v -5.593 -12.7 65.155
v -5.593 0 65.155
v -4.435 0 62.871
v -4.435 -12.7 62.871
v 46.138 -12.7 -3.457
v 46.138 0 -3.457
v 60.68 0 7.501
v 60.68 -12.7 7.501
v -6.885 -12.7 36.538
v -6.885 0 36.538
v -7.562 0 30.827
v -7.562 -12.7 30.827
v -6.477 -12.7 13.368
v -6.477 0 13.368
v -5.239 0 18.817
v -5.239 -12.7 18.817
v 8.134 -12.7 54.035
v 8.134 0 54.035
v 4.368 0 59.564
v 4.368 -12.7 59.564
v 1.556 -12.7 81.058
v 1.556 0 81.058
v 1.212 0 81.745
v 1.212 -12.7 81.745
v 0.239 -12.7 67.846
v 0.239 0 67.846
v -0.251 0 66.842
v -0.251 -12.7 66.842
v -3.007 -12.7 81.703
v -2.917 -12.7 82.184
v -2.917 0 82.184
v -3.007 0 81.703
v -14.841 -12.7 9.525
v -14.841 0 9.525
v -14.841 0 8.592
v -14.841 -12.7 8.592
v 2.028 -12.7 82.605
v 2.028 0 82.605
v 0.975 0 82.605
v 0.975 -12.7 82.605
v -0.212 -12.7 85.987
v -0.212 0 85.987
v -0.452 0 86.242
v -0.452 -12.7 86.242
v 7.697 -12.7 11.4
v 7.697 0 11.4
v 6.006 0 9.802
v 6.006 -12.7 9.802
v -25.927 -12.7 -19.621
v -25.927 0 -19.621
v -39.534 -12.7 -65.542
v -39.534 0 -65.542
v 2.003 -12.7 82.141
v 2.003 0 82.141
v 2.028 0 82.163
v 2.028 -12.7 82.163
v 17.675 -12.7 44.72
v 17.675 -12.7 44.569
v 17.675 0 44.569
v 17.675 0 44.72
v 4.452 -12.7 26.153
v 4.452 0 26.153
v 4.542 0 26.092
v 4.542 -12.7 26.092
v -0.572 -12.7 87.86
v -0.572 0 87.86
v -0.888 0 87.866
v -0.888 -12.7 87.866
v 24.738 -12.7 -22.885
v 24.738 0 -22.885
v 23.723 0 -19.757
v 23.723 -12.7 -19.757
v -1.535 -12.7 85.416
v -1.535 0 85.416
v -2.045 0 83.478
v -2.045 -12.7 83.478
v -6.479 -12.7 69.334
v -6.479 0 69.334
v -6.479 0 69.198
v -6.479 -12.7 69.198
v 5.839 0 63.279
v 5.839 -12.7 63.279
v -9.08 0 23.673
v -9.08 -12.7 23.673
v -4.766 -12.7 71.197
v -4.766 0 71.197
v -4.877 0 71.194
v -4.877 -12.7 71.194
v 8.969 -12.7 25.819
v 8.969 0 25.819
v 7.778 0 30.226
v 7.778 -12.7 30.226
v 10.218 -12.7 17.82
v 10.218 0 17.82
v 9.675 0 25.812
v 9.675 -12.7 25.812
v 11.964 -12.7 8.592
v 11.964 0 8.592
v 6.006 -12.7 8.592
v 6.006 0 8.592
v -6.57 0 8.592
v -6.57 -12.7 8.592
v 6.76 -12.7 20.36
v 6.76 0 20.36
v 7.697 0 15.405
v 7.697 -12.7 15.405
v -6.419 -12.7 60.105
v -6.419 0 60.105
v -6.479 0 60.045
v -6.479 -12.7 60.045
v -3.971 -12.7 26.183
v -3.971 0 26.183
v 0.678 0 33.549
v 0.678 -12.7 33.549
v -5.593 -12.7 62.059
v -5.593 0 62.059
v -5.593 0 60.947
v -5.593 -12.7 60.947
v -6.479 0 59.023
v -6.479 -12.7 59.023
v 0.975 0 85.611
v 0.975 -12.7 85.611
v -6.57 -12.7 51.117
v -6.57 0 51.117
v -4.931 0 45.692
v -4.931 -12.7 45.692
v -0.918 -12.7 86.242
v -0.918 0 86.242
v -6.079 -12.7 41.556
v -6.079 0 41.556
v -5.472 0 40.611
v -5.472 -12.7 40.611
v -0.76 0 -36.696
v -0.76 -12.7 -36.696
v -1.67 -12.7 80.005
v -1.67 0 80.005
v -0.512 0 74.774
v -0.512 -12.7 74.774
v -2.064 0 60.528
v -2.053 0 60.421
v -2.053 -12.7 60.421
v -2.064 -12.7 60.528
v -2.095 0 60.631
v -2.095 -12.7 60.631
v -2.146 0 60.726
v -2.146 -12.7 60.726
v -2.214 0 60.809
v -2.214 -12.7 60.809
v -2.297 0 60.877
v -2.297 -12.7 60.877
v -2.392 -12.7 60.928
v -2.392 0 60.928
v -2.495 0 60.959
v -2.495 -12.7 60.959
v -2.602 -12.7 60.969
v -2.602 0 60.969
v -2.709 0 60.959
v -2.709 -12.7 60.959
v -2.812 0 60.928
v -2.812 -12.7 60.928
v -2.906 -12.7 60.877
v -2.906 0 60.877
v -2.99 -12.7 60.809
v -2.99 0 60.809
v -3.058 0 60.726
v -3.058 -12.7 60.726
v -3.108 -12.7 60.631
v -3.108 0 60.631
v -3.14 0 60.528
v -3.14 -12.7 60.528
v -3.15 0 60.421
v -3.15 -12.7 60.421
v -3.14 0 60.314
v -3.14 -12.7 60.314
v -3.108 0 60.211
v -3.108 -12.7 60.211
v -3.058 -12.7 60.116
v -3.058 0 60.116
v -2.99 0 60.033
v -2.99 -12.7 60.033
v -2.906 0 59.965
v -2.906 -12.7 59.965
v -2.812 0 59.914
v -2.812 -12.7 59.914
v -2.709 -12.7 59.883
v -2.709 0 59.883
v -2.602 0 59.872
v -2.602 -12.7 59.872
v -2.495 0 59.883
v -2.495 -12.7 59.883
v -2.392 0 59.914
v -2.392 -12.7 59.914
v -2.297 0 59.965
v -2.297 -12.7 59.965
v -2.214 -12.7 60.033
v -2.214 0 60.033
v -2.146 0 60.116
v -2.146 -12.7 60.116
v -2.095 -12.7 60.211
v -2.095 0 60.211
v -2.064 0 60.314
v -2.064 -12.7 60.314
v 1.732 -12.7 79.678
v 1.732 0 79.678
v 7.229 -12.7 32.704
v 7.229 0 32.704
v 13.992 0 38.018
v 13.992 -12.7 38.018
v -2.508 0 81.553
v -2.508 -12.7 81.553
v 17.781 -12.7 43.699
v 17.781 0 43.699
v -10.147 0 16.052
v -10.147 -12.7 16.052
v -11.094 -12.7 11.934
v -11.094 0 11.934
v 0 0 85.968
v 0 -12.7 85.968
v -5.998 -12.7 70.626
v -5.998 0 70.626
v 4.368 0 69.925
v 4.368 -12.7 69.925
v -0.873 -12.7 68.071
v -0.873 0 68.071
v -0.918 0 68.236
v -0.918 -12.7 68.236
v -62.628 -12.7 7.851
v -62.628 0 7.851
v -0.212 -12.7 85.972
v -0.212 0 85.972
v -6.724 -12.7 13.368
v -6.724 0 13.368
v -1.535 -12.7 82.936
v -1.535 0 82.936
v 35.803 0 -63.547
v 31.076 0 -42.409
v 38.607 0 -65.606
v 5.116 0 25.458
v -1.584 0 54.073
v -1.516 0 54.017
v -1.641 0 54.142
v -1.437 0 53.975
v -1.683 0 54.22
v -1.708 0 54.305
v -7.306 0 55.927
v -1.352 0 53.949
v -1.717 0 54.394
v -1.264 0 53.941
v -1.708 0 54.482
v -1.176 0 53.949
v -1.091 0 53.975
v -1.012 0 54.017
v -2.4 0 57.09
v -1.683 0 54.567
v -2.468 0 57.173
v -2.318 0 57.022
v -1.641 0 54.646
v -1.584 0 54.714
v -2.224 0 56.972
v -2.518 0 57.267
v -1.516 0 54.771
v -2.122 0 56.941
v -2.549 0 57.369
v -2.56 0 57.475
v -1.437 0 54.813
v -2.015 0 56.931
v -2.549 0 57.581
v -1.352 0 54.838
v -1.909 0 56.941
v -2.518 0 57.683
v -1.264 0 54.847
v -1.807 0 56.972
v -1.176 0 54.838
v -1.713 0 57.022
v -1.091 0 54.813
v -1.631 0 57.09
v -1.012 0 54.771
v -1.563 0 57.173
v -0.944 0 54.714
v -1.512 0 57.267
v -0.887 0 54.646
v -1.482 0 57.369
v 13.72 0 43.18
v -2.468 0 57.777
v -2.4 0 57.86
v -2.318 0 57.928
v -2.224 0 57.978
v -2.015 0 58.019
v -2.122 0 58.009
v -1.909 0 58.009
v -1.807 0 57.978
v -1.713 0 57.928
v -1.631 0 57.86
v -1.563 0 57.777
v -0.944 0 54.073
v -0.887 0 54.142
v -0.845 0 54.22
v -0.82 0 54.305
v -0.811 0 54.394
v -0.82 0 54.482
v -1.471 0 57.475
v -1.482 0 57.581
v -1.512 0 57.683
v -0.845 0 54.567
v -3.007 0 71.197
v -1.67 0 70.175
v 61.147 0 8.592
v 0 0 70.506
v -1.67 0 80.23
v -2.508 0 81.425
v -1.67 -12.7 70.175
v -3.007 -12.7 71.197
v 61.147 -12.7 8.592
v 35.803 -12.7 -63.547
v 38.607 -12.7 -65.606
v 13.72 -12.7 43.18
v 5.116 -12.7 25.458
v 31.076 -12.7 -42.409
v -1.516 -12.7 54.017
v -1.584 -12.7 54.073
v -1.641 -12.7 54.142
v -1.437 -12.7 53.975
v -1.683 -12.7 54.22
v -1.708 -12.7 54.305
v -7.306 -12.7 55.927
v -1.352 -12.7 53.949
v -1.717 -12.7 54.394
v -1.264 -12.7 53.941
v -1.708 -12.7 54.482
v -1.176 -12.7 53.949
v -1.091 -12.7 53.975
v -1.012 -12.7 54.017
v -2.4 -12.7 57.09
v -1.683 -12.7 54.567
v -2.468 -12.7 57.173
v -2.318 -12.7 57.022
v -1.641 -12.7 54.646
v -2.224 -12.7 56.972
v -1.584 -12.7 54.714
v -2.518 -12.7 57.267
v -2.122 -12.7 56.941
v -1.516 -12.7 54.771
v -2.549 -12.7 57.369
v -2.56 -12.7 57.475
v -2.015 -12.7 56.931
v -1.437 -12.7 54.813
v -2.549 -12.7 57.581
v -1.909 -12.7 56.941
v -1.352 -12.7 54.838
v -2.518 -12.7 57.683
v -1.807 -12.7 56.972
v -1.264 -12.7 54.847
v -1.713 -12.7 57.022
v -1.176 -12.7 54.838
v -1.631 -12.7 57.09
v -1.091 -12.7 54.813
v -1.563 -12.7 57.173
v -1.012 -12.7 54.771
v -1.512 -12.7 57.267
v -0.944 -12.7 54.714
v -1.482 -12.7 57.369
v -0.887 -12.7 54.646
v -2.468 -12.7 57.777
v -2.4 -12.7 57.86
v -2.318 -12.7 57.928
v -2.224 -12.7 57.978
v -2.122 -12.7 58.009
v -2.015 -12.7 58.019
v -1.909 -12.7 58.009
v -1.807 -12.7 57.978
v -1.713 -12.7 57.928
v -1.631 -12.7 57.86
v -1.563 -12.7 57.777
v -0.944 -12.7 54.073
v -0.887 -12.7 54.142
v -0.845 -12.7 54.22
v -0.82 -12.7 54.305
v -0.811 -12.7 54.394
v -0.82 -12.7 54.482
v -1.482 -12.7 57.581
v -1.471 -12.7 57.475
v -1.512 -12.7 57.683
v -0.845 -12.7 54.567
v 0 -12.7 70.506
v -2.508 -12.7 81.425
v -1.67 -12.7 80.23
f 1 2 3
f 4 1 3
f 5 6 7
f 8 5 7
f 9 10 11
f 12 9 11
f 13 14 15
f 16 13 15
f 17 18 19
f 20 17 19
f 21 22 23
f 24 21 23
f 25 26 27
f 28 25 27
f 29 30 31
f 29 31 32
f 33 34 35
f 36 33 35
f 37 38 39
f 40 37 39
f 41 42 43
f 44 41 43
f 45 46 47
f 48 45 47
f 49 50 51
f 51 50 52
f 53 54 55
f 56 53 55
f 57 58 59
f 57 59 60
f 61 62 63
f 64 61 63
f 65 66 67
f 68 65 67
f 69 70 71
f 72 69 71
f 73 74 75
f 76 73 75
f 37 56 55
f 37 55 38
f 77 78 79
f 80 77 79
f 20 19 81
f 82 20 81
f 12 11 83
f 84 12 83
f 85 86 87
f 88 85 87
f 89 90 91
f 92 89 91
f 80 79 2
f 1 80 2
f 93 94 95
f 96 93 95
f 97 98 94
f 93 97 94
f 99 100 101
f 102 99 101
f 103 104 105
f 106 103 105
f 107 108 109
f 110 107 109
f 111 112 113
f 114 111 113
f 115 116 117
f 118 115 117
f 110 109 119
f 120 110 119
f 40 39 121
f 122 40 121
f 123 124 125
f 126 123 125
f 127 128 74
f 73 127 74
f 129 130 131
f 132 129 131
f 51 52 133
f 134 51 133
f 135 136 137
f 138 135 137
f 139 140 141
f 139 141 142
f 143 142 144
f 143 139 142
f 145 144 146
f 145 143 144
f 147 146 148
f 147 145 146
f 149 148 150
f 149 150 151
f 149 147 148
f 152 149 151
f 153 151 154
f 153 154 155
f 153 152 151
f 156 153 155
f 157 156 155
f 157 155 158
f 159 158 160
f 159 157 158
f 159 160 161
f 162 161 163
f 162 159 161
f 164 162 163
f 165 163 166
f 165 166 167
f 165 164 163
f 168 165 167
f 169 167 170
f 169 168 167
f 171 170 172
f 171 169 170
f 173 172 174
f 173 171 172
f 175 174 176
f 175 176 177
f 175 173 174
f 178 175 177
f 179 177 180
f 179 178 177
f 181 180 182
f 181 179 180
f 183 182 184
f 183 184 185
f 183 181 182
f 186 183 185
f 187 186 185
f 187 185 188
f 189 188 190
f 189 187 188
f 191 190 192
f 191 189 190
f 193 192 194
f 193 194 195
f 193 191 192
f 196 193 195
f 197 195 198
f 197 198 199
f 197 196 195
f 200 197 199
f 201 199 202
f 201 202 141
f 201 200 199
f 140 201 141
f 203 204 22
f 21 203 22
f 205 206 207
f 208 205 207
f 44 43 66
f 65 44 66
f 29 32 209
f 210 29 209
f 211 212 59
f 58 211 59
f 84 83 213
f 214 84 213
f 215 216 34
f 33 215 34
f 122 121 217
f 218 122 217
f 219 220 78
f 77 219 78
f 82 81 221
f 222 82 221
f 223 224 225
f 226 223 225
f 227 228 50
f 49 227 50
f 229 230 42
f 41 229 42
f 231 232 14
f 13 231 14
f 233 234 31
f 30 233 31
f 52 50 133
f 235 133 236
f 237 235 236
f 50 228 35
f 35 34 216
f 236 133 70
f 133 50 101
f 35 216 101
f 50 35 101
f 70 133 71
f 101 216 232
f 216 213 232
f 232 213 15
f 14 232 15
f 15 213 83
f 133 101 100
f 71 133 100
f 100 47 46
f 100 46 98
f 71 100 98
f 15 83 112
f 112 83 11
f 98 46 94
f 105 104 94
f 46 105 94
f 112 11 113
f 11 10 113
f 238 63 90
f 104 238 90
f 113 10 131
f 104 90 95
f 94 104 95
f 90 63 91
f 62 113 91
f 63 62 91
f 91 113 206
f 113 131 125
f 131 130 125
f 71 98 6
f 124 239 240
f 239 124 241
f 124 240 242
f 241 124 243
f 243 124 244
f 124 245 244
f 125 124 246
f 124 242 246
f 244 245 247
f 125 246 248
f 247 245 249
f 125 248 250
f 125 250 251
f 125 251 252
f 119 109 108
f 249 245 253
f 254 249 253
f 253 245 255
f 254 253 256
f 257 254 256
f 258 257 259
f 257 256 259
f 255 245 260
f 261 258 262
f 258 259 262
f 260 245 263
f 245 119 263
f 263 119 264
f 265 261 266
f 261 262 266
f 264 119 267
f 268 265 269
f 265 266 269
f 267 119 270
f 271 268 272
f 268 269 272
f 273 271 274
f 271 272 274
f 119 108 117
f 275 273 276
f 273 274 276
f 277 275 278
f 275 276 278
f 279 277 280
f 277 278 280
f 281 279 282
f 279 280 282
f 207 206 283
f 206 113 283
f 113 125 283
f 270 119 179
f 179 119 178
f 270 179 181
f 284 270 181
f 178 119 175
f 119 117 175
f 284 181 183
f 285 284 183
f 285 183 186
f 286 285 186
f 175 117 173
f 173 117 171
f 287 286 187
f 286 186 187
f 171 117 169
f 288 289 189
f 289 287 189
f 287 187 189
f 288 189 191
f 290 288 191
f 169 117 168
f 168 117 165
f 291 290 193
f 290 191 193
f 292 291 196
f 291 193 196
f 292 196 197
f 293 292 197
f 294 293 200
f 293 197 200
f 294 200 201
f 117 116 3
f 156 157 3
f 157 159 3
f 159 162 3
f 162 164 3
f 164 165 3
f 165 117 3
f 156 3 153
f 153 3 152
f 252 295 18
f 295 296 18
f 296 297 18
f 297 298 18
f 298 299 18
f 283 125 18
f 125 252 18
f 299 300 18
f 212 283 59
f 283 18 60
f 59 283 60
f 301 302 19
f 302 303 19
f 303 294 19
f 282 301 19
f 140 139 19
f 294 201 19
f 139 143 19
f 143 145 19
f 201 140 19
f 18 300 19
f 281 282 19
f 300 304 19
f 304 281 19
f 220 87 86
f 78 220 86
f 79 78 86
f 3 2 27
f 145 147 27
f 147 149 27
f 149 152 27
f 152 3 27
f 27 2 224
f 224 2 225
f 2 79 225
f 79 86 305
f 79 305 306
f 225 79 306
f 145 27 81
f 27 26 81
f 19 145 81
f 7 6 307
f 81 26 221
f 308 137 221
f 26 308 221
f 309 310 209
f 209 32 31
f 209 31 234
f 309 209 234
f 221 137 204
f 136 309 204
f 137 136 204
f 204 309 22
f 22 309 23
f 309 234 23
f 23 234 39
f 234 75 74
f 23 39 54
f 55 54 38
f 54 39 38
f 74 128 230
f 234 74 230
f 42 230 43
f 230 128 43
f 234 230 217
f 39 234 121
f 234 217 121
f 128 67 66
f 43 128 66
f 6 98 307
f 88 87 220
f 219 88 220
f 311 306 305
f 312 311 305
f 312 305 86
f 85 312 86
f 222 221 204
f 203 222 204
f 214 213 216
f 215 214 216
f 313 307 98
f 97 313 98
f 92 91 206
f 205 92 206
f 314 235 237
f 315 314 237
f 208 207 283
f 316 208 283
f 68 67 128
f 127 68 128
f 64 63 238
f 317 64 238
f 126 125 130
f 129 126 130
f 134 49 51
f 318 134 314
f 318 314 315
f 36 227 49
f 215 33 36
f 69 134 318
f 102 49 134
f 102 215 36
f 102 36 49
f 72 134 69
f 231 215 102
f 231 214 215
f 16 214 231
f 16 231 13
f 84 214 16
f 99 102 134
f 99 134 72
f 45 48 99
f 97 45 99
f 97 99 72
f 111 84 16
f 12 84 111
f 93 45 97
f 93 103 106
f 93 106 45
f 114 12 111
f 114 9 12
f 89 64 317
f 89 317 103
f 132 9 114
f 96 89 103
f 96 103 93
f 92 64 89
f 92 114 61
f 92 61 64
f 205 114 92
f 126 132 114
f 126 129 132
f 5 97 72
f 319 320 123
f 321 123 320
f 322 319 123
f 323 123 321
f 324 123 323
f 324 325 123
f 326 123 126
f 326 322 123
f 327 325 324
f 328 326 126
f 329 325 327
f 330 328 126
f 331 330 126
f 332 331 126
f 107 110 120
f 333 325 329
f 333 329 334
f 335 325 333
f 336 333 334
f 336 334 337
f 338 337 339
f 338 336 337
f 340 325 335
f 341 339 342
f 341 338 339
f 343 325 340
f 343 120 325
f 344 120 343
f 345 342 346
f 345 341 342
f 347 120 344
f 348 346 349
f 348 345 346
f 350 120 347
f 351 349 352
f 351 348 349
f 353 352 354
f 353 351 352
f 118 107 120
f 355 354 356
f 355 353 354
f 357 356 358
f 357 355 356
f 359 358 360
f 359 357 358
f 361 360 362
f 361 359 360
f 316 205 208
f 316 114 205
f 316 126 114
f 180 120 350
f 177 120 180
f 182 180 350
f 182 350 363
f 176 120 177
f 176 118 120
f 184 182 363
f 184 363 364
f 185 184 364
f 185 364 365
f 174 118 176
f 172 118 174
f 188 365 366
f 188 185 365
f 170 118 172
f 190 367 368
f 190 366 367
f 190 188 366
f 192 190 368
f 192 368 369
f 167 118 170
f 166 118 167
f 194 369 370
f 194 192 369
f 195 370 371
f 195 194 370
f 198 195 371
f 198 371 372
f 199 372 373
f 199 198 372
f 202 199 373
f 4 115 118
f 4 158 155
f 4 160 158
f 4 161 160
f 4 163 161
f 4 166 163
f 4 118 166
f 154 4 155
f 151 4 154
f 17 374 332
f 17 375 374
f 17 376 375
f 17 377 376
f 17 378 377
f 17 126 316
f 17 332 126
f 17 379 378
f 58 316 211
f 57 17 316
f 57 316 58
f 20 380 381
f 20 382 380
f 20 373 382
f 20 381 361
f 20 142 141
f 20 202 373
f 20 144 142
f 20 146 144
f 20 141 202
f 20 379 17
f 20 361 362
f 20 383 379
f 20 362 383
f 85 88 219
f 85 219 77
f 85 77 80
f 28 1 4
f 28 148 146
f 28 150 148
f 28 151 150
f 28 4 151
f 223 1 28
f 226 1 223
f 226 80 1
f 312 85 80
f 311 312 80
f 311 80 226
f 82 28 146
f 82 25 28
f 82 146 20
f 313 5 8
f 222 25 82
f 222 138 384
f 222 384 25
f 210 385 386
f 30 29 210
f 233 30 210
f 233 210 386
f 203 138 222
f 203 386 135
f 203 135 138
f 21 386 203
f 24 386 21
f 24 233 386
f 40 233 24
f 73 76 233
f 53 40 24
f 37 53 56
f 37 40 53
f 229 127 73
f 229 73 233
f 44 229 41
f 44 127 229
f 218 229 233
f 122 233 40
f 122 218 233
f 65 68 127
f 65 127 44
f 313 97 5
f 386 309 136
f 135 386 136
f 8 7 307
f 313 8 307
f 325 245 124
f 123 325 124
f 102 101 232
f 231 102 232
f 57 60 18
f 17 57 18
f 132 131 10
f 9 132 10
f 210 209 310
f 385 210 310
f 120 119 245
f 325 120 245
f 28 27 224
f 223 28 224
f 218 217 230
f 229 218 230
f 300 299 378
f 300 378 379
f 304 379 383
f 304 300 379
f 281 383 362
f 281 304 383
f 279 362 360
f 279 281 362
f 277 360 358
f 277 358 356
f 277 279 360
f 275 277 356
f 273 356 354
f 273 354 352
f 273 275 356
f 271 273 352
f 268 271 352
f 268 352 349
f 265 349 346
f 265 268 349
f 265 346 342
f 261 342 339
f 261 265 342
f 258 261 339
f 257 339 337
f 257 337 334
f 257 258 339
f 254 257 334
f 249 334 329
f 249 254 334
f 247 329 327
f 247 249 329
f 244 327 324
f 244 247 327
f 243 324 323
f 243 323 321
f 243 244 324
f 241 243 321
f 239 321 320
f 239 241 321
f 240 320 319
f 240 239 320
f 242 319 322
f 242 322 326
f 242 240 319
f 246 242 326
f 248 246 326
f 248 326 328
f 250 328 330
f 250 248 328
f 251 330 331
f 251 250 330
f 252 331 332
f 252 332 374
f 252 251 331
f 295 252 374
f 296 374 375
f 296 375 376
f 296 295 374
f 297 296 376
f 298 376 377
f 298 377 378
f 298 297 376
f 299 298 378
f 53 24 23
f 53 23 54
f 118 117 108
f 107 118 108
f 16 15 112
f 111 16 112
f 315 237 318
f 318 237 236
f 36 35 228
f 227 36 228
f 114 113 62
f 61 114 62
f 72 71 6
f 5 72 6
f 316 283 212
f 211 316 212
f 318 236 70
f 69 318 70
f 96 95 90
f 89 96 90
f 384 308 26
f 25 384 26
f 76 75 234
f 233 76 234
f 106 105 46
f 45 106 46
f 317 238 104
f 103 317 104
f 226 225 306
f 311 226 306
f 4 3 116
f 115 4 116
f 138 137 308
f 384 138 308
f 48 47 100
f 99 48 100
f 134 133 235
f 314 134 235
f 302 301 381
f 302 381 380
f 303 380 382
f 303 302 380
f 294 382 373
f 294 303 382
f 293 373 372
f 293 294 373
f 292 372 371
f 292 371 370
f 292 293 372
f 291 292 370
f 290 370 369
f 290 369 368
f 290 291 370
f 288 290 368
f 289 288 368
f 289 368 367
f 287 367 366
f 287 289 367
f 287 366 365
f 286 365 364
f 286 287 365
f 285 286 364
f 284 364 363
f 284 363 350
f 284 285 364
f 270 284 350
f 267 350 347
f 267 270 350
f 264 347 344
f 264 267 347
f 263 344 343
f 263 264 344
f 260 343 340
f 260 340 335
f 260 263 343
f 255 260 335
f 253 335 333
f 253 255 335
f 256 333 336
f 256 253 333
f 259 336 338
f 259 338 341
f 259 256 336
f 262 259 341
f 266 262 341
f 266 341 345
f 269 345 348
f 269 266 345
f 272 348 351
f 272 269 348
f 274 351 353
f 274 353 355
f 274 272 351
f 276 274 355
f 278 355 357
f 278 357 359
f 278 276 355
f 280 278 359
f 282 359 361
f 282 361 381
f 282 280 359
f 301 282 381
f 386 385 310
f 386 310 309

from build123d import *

# Parameters (mm, degrees)
F0_R     = 0.453147
F0_R_2   = 0.54441
F0_R_3   = 0.54854
F1_DEPTH = 12.7


with BuildPart() as f1:
    # F0 (on Front) → F1 (new body)
    with BuildSketch(Plane.XZ):
        Polygon((-39.533757, -65.54234), (-0.760193, -36.696203), (35.802592, -63.547), (38.606675, -65.606249), (31.076437, -42.409137), (24.738393, -22.884612), (23.723046, -19.756807), (46.13781, -3.457308), (60.679827, 7.501139), (61.14725, 8.591791), (11.964072, 8.591791), (10.218171, 17.820274), (9.674744, 25.812406), (8.968875, 25.819117), (7.777616, 30.226135), (7.229322, 32.704141), (13.991971, 38.017649), (13.720257, 43.180205), (17.780535, 43.698543), (17.675199, 44.568963), (17.675199, 44.719916), (8.1342, 54.03503), (4.368194, 59.564289), (5.838566, 63.279467), (4.368194, 69.924787), (1.731881, 79.677723), (1.555634, 81.05831), (1.212185, 81.745215), (2.003027, 82.140632), (2.027594, 82.16323), (2.027594, 82.605079), (0.975498, 82.605079), (0.975498, 85.611068), (0, 85.967864), (-0.211868, 85.971788), (-0.211868, 85.986815), (-0.452347, 86.242326), (-0.571582, 87.859698), (-0.888215, 87.865561), (-0.918275, 86.242326), (-1.534503, 85.415684), (-2.044514, 83.477632), (-1.534503, 82.935743), (-2.917258, 82.18424), (-3.007438, 81.703283), (-2.507543, 81.552982), (-2.507543, 81.424944), (-1.669773, 80.230348), (-1.669773, 80.004901), (-0.512467, 74.774474), (0, 70.505977), (0.239031, 67.845672), (-0.250665, 66.842255), (-0.873186, 68.071127), (-0.918276, 68.236455), (-1.669773, 70.175312), (-3.007438, 71.197353), (-4.765941, 71.197353), (-4.877486, 71.194044), (-5.998397, 70.626214), (-6.479356, 69.333635), (-6.479356, 69.19837), (-5.592589, 65.155312), (-4.435283, 62.870763), (-5.592589, 62.059145), (-5.592589, 61.938908), (-5.592589, 60.94693), (-6.419236, 60.105253), (-6.479356, 60.045134), (-6.479356, 59.023097), (-7.306002, 55.92693), (-6.569892, 51.117349), (-4.931271, 45.691539), (-6.079414, 41.555599), (-5.472349, 40.611416), (-6.885163, 36.538303), (-7.561511, 30.826923), (-9.079536, 23.672668), (-10.146662, 16.052486), (-11.093548, 11.934282), (-14.841024, 9.524833), (-14.841024, 8.591791), (-62.628269, 7.850908), (-25.927428, -19.620989), align=None)
        with Locations((-1.263964, 54.393876)):
            Circle(F0_R, mode=Mode.SUBTRACT)
        with Locations((-2.015462, 57.475016)):
            Circle(F0_R_2, mode=Mode.SUBTRACT)
        with Locations((-2.60163, 60.420882)):
            Circle(F0_R_3, mode=Mode.SUBTRACT)
        Polygon((6.005918, 9.801562), (6.005918, 8.591791), (-6.569892, 8.591791), (-6.723631, 13.368296), (-6.477118, 13.368296), (-5.239312, 18.816557), (-3.971315, 26.183013), (0.678006, 33.549469), (4.451805, 26.152823), (4.542376, 26.092442), (5.115994, 25.458444), (6.759554, 20.360412), (7.697042, 15.405042), (7.697042, 11.400443), align=None, mode=Mode.SUBTRACT)
    extrude(amount=F1_DEPTH)


solid = f1.part
